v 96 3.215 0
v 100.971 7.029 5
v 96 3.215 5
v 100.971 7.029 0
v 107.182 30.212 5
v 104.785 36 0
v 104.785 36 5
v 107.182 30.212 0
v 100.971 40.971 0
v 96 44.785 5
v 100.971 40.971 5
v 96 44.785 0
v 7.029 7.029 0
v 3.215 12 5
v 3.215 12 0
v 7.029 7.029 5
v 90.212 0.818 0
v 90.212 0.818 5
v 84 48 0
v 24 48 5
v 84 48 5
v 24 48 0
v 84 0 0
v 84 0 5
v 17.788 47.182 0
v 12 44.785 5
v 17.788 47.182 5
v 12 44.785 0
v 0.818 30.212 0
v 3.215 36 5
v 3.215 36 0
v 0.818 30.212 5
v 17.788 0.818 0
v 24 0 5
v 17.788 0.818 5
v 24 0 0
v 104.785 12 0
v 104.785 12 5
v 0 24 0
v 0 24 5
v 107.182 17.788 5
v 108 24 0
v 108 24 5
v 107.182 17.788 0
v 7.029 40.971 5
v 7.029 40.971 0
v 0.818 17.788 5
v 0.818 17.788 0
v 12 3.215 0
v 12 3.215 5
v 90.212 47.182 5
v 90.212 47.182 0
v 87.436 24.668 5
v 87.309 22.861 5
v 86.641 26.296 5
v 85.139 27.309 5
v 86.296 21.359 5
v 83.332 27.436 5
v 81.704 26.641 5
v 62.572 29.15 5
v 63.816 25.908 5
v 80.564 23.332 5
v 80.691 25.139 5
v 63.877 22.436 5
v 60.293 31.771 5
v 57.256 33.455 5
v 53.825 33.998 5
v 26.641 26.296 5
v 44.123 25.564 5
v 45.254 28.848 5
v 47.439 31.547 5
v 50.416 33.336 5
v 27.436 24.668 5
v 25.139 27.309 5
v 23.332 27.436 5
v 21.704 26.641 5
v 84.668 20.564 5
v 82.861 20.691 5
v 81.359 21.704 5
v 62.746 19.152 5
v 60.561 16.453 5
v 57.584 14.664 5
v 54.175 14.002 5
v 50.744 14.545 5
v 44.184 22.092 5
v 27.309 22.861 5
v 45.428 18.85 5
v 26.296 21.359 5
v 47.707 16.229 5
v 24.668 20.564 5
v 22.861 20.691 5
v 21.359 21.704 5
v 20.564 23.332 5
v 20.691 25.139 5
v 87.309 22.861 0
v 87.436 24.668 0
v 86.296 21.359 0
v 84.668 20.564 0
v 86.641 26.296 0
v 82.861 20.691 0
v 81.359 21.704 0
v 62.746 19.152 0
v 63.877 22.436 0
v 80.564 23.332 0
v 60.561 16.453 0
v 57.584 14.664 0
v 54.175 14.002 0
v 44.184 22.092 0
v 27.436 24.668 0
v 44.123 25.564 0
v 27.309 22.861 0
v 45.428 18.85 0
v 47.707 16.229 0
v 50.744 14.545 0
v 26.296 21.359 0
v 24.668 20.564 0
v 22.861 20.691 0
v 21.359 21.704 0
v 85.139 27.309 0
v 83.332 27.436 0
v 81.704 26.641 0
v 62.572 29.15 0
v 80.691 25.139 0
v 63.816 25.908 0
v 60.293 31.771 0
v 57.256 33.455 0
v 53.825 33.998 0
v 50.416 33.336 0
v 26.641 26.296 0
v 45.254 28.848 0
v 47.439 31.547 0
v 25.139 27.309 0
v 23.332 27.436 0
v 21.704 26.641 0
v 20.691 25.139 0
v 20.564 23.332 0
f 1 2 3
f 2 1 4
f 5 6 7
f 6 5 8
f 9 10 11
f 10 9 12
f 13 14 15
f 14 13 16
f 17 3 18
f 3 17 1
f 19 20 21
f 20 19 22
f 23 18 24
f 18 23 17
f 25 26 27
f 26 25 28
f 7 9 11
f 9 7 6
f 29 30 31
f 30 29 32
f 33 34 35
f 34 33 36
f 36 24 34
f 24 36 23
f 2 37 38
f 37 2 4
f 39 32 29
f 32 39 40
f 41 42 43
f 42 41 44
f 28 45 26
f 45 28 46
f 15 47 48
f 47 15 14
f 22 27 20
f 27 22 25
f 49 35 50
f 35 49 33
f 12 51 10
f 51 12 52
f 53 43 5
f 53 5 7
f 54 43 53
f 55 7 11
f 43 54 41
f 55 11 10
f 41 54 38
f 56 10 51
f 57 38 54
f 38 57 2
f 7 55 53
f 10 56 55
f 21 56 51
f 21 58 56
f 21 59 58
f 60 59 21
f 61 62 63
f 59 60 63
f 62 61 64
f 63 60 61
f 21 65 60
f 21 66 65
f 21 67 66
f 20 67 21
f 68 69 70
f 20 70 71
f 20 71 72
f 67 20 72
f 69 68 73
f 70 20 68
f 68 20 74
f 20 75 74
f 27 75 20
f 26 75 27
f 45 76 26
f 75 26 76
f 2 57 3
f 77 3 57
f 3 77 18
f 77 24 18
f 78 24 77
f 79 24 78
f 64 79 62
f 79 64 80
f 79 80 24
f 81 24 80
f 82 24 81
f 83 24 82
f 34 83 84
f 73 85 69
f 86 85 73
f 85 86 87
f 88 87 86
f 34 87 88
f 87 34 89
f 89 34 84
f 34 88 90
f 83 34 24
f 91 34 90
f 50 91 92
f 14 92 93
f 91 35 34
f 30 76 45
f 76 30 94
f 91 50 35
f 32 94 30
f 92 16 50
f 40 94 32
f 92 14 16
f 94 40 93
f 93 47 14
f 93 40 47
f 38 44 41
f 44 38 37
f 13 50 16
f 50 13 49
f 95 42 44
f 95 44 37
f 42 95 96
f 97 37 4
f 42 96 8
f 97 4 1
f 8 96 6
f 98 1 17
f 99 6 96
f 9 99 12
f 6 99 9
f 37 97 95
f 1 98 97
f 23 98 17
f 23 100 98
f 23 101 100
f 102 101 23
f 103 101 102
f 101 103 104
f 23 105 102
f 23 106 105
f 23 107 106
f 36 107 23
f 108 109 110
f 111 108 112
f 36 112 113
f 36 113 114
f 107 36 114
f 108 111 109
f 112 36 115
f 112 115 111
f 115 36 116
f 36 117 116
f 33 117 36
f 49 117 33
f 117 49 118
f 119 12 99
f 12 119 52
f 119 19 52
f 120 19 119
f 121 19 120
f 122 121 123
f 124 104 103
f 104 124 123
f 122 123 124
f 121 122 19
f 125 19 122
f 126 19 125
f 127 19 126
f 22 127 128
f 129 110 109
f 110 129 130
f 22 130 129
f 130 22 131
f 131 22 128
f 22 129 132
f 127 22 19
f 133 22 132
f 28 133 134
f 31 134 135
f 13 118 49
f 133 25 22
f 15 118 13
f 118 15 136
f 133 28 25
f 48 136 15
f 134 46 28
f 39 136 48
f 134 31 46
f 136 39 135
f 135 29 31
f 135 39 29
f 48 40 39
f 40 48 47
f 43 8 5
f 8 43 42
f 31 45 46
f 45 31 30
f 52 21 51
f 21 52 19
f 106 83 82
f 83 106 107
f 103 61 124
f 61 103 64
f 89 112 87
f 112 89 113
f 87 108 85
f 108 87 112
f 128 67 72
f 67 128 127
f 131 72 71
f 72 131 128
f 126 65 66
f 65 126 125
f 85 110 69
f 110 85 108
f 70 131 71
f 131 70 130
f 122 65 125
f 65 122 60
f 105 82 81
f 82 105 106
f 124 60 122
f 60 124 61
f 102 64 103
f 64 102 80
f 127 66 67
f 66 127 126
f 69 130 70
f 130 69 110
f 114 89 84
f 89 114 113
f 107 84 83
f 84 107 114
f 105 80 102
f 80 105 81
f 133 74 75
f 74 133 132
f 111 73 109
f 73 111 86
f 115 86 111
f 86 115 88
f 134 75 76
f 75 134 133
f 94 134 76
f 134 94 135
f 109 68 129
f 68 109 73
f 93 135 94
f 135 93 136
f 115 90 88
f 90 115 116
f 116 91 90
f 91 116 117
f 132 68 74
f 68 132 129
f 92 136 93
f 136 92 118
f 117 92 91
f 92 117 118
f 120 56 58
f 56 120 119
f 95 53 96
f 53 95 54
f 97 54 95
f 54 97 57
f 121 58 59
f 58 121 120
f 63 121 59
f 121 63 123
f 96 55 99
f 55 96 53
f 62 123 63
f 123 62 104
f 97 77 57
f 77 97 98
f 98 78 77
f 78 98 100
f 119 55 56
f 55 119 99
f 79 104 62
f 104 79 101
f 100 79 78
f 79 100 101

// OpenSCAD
$fn = 32;

// ----------------------------------------------------------------------
// Spacer plate: obround span 60, caps R24
// ----------------------------------------------------------------------

// --- parameters (mm) ---
bore_r = 10;              // centre bore radius
bolt_r = 3.5;             // bolt hole radius
plate_t = 5;              // plate thickness, Z (extrusion height)
span = 60;                // obround span
cap_r = 24;               // cap radius

profile = [[24, 48], [17.788, 47.182], [12, 44.785], [7.029, 40.971], [3.215, 36], [0.818, 30.212], [0, 24], [0.818, 17.788], [3.215, 12], [7.029, 7.029], [12, 3.215], [17.788, 0.818], [24, 0], [84, 0], [90.212, 0.818], [96, 3.215], [100.971, 7.029], [104.785, 12], [107.182, 17.788], [108, 24], [107.182, 30.212], [104.785, 36], [100.971, 40.971], [96, 44.785], [90.212, 47.182], [84, 48]];  // primary outline, 26 points, counter clockwise
void_1 = [[63.816, 25.908], [62.572, 29.15], [60.293, 31.771], [57.256, 33.455], [53.825, 33.998], [50.416, 33.336], [47.439, 31.547], [45.254, 28.848], [44.123, 25.564], [44.184, 22.092], [45.428, 18.85], [47.707, 16.229], [50.744, 14.545], [54.175, 14.002], [57.584, 14.664], [60.561, 16.453], [62.746, 19.152], [63.877, 22.436]];  // centre bore, 18 points
void_2 = [[27.436, 24.668], [26.641, 26.296], [25.139, 27.309], [23.332, 27.436], [21.704, 26.641], [20.691, 25.139], [20.564, 23.332], [21.359, 21.704], [22.861, 20.691], [24.668, 20.564], [26.296, 21.359], [27.309, 22.861]];  // end hole, 12 points
void_3 = [[87.436, 24.668], [86.641, 26.296], [85.139, 27.309], [83.332, 27.436], [81.704, 26.641], [80.691, 25.139], [80.564, 23.332], [81.359, 21.704], [82.861, 20.691], [84.668, 20.564], [86.296, 21.359], [87.309, 22.861]];  // end hole, 12 points

// --- the one profile operation ---
difference() {
  linear_extrude(height = plate_t) polygon(points = profile);
  translate([0, 0, -1])
    linear_extrude(height = plate_t + 2) polygon(points = void_1);
  translate([0, 0, -1])
    linear_extrude(height = plate_t + 2) polygon(points = void_2);
  translate([0, 0, -1])
    linear_extrude(height = plate_t + 2) polygon(points = void_3);
}
